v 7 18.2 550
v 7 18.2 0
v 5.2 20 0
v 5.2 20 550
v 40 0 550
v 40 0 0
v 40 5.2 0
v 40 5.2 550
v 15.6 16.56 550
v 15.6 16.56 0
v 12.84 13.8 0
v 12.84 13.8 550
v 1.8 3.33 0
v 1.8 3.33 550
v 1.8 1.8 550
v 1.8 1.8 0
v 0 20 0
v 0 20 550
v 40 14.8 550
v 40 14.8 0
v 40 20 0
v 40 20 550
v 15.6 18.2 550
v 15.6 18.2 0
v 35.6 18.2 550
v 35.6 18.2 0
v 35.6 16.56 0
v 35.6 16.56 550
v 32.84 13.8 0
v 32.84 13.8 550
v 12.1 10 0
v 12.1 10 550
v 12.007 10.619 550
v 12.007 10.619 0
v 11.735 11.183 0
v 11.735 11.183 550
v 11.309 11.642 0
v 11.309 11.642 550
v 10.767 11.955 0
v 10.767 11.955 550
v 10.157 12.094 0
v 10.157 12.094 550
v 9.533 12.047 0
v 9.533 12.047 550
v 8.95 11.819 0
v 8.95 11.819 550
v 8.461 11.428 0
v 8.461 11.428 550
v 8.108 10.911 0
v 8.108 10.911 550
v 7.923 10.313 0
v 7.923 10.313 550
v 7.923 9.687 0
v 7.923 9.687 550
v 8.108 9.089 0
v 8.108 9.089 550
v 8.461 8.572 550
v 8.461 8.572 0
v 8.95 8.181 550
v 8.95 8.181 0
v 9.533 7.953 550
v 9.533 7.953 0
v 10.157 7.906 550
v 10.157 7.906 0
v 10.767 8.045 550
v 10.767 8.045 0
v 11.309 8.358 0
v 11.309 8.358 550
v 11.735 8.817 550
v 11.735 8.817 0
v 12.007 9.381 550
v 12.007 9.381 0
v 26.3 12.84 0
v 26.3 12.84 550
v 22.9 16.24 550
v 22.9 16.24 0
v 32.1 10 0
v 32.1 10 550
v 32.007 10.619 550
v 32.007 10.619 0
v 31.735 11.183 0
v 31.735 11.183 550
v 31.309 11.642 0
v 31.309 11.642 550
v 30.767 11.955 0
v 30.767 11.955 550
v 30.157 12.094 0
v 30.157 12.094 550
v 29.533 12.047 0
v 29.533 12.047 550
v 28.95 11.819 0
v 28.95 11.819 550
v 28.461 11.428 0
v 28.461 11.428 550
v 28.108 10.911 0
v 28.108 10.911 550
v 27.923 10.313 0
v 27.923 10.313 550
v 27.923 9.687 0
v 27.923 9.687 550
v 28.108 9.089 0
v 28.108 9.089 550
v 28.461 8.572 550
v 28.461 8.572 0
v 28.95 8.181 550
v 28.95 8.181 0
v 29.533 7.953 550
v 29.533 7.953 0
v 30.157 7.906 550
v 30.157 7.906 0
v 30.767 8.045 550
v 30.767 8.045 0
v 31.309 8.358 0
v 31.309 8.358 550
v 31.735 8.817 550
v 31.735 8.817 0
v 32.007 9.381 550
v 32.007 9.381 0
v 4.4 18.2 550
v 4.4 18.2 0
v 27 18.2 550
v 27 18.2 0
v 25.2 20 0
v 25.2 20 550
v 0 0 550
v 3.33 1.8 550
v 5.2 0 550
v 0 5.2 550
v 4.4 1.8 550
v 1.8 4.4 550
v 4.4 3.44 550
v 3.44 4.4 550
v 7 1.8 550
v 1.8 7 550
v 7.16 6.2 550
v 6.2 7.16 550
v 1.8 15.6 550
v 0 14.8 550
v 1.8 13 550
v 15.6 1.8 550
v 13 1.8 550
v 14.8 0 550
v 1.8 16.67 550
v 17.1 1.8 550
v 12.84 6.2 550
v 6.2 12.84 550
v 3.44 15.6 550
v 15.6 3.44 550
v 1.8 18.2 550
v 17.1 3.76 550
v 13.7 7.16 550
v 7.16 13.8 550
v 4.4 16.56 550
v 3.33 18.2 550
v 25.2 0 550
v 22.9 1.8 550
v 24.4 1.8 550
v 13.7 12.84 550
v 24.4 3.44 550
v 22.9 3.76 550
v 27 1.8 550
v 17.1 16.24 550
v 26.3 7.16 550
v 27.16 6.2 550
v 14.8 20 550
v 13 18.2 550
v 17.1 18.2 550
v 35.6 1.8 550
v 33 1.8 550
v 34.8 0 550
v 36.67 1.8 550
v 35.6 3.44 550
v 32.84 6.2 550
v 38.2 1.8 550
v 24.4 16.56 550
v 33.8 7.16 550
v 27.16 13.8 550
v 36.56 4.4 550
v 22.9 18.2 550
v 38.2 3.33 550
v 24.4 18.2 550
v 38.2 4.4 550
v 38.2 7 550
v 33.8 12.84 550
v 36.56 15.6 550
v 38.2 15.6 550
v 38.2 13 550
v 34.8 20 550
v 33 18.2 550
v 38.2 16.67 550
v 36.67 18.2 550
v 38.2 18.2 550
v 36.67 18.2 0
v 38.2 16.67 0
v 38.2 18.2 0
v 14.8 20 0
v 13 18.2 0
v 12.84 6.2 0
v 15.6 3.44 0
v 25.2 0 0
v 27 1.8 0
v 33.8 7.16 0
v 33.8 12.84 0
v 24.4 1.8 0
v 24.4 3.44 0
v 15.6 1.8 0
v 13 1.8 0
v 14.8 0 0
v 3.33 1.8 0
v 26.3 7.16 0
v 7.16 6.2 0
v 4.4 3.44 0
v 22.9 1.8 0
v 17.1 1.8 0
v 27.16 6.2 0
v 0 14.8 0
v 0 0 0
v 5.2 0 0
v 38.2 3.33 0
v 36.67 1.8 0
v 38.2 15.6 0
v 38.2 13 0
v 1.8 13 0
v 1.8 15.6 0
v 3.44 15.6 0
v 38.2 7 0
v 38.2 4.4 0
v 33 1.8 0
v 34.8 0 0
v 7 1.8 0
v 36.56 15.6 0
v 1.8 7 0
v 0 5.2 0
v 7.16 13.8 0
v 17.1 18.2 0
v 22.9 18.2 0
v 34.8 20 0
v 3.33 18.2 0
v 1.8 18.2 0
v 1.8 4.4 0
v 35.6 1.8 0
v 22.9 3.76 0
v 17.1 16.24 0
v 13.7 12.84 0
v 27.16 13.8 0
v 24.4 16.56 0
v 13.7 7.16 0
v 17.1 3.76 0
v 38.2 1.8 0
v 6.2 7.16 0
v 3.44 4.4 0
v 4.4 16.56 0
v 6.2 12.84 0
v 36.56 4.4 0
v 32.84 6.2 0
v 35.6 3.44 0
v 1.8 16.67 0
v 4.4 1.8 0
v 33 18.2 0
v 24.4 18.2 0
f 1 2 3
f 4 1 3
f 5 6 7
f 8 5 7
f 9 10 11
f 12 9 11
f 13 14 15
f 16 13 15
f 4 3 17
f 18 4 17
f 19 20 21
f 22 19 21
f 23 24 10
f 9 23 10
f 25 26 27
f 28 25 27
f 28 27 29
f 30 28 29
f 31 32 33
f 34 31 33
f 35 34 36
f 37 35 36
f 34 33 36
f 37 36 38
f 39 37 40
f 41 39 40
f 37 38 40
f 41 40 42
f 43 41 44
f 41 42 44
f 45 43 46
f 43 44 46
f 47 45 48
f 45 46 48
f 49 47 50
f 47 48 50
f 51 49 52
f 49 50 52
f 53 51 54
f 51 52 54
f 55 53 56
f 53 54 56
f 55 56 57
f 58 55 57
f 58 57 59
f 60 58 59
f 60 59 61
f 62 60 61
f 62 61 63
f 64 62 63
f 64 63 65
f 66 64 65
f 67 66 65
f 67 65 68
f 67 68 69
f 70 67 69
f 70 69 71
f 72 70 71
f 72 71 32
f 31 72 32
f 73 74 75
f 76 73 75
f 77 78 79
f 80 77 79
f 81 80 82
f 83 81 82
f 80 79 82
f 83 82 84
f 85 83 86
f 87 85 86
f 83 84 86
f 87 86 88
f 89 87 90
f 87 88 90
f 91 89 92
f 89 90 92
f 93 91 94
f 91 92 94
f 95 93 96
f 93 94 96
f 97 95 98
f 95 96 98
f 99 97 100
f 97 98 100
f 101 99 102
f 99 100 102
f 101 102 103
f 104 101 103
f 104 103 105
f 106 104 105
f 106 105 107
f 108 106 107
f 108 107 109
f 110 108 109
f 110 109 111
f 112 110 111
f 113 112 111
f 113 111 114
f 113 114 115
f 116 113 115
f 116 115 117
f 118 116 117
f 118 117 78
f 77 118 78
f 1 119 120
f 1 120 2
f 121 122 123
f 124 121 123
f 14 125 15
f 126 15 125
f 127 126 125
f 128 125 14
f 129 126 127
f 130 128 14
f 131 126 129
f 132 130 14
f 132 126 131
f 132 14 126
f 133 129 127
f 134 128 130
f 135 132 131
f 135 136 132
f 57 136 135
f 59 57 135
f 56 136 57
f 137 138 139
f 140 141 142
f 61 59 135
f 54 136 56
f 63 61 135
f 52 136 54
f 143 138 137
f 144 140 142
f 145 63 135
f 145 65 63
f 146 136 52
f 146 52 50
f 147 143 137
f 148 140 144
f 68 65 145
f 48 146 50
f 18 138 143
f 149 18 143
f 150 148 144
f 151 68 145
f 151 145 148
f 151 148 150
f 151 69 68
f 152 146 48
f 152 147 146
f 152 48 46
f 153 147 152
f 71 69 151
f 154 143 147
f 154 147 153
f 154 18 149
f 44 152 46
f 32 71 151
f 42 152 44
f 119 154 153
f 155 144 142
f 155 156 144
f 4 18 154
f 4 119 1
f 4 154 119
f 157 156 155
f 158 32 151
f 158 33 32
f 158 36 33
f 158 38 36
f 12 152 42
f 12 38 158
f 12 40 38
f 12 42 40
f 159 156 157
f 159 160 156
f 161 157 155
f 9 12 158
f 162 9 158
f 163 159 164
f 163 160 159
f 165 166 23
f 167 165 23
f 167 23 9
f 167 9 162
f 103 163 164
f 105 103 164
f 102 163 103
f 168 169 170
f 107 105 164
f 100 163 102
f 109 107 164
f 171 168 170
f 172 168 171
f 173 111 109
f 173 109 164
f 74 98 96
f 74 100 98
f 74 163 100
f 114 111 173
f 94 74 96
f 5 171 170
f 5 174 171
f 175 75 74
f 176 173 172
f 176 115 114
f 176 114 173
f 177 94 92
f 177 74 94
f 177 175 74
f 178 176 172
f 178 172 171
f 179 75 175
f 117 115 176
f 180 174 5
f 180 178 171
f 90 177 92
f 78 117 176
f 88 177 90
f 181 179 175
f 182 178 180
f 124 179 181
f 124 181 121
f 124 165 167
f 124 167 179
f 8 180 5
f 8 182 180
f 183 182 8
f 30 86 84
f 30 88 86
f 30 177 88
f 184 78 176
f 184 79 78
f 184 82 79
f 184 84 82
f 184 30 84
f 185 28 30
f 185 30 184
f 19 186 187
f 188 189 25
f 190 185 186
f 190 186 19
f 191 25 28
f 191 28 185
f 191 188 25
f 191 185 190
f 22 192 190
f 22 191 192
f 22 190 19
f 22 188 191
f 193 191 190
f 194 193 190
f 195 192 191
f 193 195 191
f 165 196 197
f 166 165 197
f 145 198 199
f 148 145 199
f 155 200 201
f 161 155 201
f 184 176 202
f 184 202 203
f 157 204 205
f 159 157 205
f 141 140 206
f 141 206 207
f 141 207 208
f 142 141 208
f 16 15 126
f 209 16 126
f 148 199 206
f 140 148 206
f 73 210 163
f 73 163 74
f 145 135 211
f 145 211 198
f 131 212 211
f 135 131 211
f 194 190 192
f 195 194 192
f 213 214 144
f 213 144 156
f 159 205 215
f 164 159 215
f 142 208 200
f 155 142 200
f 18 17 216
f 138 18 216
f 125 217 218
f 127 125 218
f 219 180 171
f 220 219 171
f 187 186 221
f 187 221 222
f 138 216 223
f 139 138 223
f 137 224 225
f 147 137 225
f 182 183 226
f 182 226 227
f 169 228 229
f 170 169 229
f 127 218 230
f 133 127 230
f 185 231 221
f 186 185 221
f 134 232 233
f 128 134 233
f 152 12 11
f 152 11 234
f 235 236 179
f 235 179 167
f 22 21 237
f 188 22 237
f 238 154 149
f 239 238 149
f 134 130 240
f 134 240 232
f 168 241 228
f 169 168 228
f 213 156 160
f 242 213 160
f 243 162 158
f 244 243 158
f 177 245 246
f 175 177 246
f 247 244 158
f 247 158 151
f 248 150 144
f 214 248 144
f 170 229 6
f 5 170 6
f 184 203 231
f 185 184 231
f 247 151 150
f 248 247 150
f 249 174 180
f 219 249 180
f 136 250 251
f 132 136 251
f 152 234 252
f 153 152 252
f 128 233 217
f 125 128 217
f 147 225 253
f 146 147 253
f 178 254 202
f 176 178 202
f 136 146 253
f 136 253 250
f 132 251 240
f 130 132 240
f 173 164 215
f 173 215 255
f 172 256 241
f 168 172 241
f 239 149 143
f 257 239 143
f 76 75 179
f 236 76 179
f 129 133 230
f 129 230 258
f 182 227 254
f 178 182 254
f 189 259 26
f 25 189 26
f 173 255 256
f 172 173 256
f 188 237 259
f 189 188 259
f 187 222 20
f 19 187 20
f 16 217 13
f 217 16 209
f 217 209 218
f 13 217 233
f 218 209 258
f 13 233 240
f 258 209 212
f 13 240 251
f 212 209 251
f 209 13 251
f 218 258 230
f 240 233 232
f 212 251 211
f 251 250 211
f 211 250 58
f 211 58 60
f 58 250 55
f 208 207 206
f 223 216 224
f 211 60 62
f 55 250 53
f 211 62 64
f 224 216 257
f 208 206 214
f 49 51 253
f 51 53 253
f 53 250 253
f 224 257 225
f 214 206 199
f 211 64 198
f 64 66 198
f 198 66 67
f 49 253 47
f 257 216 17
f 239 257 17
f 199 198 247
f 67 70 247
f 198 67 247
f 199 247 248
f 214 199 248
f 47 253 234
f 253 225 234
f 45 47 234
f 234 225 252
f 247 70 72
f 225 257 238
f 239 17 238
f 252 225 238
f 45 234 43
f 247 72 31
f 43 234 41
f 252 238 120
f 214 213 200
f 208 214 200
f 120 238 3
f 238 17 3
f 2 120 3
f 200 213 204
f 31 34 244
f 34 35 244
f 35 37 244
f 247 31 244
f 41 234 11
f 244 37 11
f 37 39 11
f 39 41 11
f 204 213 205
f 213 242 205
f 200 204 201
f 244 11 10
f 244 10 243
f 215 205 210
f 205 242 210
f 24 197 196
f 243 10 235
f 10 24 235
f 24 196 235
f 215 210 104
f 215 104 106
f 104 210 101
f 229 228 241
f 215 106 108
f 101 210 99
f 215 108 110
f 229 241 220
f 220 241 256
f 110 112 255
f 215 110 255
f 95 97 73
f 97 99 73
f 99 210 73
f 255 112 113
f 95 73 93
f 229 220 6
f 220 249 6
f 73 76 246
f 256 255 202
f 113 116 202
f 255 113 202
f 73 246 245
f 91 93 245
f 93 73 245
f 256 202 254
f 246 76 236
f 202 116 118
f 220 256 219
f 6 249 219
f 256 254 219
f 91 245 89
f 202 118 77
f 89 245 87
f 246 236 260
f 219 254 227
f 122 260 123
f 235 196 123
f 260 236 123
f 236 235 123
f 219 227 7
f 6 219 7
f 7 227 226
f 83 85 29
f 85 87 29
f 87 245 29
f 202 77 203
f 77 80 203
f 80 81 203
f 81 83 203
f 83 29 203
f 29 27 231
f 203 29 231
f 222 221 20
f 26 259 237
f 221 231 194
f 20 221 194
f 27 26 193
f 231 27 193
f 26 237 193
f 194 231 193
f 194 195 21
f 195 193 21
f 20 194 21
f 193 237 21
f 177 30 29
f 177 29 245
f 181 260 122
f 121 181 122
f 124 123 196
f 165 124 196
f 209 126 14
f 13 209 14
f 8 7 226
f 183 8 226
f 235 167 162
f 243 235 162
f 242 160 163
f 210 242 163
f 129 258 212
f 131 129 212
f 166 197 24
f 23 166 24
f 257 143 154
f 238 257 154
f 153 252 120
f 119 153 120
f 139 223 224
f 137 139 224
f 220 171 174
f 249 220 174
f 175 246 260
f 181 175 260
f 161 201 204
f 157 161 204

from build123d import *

# Parameters (mm, degrees)
F1_DEPTH = 1500
F3_DEPTH = 1500.001
F4_R     = 2.1
F5_DEPTH = 1500.001
F6_DEPTH = 950


with BuildPart() as f1:
    # F0 (on Top) → F1 (new body)
    with BuildSketch(Plane.XY):
        Polygon((0, 5.2), (0, 0), (5.2, 0), (7, 1.8), (4.4, 1.8), (4.4, 3.44), (7.16, 6.2), (12.84, 6.2), (15.6, 3.44), (15.6, 1.8), (13, 1.8), (14.8, 0), (25.2, 0), (27, 1.8), (24.4, 1.8), (24.4, 3.44), (27.16, 6.2), (32.84, 6.2), (35.6, 3.44), (35.6, 1.8), (33, 1.8), (34.8, 0), (40, 0), (40, 5.2), (38.2, 7), (38.2, 4.4), (36.56, 4.4), (33.8, 7.16), (33.8, 12.84), (36.56, 15.6), (38.2, 15.6), (38.2, 13), (40, 14.8), (40, 20), (34.8, 20), (33, 18.2), (35.6, 18.2), (35.6, 16.56), (32.84, 13.8), (27.16, 13.8), (24.4, 16.56), (24.4, 18.2), (27, 18.2), (25.2, 20), (14.8, 20), (13, 18.2), (15.6, 18.2), (15.6, 16.56), (12.84, 13.8), (7.16, 13.8), (4.4, 16.56), (4.4, 18.2), (7, 18.2), (5.2, 20), (0, 20), (0, 14.8), (1.8, 13), (1.8, 15.6), (3.44, 15.6), (6.2, 12.84), (6.2, 7.16), (3.44, 4.4), (1.8, 4.4), (1.8, 7), align=None)
    extrude(amount=F1_DEPTH)

    # F2 (on face) → F3 (cut, through all)
    with BuildSketch(Plane.XY.offset(1500)):
        Polygon((3.33, 18.2), (1.8, 18.2), (1.8, 16.67), align=None)
        Polygon((1.8, 3.33), (1.8, 1.8), (3.33, 1.8), align=None)
        Polygon((36.67, 1.8), (38.2, 1.8), (38.2, 3.33), align=None)
        Polygon((38.2, 16.67), (38.2, 18.2), (36.67, 18.2), align=None)
    extrude(amount=-F3_DEPTH, mode=Mode.SUBTRACT)

    # F4 (on face) → F5 (cut, through all)
    with BuildSketch(Plane.XY.offset(1500)):
        Polygon((22.9, 18.2), (17.1, 18.2), (17.1, 16.24), (13.7, 12.84), (13.7, 7.16), (17.1, 3.76), (17.1, 1.8), (22.9, 1.8), (22.9, 3.76), (26.3, 7.16), (26.3, 12.84), (22.9, 16.24), align=None)
        with Locations((30, 10)):
            Circle(F4_R)
        with Locations((10, 10)):
            Circle(F4_R)
    extrude(amount=-F5_DEPTH, mode=Mode.SUBTRACT)

    # F6 (cut): a face of the model
    f6_faces = [f1.faces().sort_by_distance(p)[0] for p in [
        (0.4472135955, 2.6, 1500),
    ]]
    extrude(f6_faces, amount=-F6_DEPTH, mode=Mode.SUBTRACT)


solid = f1.part
